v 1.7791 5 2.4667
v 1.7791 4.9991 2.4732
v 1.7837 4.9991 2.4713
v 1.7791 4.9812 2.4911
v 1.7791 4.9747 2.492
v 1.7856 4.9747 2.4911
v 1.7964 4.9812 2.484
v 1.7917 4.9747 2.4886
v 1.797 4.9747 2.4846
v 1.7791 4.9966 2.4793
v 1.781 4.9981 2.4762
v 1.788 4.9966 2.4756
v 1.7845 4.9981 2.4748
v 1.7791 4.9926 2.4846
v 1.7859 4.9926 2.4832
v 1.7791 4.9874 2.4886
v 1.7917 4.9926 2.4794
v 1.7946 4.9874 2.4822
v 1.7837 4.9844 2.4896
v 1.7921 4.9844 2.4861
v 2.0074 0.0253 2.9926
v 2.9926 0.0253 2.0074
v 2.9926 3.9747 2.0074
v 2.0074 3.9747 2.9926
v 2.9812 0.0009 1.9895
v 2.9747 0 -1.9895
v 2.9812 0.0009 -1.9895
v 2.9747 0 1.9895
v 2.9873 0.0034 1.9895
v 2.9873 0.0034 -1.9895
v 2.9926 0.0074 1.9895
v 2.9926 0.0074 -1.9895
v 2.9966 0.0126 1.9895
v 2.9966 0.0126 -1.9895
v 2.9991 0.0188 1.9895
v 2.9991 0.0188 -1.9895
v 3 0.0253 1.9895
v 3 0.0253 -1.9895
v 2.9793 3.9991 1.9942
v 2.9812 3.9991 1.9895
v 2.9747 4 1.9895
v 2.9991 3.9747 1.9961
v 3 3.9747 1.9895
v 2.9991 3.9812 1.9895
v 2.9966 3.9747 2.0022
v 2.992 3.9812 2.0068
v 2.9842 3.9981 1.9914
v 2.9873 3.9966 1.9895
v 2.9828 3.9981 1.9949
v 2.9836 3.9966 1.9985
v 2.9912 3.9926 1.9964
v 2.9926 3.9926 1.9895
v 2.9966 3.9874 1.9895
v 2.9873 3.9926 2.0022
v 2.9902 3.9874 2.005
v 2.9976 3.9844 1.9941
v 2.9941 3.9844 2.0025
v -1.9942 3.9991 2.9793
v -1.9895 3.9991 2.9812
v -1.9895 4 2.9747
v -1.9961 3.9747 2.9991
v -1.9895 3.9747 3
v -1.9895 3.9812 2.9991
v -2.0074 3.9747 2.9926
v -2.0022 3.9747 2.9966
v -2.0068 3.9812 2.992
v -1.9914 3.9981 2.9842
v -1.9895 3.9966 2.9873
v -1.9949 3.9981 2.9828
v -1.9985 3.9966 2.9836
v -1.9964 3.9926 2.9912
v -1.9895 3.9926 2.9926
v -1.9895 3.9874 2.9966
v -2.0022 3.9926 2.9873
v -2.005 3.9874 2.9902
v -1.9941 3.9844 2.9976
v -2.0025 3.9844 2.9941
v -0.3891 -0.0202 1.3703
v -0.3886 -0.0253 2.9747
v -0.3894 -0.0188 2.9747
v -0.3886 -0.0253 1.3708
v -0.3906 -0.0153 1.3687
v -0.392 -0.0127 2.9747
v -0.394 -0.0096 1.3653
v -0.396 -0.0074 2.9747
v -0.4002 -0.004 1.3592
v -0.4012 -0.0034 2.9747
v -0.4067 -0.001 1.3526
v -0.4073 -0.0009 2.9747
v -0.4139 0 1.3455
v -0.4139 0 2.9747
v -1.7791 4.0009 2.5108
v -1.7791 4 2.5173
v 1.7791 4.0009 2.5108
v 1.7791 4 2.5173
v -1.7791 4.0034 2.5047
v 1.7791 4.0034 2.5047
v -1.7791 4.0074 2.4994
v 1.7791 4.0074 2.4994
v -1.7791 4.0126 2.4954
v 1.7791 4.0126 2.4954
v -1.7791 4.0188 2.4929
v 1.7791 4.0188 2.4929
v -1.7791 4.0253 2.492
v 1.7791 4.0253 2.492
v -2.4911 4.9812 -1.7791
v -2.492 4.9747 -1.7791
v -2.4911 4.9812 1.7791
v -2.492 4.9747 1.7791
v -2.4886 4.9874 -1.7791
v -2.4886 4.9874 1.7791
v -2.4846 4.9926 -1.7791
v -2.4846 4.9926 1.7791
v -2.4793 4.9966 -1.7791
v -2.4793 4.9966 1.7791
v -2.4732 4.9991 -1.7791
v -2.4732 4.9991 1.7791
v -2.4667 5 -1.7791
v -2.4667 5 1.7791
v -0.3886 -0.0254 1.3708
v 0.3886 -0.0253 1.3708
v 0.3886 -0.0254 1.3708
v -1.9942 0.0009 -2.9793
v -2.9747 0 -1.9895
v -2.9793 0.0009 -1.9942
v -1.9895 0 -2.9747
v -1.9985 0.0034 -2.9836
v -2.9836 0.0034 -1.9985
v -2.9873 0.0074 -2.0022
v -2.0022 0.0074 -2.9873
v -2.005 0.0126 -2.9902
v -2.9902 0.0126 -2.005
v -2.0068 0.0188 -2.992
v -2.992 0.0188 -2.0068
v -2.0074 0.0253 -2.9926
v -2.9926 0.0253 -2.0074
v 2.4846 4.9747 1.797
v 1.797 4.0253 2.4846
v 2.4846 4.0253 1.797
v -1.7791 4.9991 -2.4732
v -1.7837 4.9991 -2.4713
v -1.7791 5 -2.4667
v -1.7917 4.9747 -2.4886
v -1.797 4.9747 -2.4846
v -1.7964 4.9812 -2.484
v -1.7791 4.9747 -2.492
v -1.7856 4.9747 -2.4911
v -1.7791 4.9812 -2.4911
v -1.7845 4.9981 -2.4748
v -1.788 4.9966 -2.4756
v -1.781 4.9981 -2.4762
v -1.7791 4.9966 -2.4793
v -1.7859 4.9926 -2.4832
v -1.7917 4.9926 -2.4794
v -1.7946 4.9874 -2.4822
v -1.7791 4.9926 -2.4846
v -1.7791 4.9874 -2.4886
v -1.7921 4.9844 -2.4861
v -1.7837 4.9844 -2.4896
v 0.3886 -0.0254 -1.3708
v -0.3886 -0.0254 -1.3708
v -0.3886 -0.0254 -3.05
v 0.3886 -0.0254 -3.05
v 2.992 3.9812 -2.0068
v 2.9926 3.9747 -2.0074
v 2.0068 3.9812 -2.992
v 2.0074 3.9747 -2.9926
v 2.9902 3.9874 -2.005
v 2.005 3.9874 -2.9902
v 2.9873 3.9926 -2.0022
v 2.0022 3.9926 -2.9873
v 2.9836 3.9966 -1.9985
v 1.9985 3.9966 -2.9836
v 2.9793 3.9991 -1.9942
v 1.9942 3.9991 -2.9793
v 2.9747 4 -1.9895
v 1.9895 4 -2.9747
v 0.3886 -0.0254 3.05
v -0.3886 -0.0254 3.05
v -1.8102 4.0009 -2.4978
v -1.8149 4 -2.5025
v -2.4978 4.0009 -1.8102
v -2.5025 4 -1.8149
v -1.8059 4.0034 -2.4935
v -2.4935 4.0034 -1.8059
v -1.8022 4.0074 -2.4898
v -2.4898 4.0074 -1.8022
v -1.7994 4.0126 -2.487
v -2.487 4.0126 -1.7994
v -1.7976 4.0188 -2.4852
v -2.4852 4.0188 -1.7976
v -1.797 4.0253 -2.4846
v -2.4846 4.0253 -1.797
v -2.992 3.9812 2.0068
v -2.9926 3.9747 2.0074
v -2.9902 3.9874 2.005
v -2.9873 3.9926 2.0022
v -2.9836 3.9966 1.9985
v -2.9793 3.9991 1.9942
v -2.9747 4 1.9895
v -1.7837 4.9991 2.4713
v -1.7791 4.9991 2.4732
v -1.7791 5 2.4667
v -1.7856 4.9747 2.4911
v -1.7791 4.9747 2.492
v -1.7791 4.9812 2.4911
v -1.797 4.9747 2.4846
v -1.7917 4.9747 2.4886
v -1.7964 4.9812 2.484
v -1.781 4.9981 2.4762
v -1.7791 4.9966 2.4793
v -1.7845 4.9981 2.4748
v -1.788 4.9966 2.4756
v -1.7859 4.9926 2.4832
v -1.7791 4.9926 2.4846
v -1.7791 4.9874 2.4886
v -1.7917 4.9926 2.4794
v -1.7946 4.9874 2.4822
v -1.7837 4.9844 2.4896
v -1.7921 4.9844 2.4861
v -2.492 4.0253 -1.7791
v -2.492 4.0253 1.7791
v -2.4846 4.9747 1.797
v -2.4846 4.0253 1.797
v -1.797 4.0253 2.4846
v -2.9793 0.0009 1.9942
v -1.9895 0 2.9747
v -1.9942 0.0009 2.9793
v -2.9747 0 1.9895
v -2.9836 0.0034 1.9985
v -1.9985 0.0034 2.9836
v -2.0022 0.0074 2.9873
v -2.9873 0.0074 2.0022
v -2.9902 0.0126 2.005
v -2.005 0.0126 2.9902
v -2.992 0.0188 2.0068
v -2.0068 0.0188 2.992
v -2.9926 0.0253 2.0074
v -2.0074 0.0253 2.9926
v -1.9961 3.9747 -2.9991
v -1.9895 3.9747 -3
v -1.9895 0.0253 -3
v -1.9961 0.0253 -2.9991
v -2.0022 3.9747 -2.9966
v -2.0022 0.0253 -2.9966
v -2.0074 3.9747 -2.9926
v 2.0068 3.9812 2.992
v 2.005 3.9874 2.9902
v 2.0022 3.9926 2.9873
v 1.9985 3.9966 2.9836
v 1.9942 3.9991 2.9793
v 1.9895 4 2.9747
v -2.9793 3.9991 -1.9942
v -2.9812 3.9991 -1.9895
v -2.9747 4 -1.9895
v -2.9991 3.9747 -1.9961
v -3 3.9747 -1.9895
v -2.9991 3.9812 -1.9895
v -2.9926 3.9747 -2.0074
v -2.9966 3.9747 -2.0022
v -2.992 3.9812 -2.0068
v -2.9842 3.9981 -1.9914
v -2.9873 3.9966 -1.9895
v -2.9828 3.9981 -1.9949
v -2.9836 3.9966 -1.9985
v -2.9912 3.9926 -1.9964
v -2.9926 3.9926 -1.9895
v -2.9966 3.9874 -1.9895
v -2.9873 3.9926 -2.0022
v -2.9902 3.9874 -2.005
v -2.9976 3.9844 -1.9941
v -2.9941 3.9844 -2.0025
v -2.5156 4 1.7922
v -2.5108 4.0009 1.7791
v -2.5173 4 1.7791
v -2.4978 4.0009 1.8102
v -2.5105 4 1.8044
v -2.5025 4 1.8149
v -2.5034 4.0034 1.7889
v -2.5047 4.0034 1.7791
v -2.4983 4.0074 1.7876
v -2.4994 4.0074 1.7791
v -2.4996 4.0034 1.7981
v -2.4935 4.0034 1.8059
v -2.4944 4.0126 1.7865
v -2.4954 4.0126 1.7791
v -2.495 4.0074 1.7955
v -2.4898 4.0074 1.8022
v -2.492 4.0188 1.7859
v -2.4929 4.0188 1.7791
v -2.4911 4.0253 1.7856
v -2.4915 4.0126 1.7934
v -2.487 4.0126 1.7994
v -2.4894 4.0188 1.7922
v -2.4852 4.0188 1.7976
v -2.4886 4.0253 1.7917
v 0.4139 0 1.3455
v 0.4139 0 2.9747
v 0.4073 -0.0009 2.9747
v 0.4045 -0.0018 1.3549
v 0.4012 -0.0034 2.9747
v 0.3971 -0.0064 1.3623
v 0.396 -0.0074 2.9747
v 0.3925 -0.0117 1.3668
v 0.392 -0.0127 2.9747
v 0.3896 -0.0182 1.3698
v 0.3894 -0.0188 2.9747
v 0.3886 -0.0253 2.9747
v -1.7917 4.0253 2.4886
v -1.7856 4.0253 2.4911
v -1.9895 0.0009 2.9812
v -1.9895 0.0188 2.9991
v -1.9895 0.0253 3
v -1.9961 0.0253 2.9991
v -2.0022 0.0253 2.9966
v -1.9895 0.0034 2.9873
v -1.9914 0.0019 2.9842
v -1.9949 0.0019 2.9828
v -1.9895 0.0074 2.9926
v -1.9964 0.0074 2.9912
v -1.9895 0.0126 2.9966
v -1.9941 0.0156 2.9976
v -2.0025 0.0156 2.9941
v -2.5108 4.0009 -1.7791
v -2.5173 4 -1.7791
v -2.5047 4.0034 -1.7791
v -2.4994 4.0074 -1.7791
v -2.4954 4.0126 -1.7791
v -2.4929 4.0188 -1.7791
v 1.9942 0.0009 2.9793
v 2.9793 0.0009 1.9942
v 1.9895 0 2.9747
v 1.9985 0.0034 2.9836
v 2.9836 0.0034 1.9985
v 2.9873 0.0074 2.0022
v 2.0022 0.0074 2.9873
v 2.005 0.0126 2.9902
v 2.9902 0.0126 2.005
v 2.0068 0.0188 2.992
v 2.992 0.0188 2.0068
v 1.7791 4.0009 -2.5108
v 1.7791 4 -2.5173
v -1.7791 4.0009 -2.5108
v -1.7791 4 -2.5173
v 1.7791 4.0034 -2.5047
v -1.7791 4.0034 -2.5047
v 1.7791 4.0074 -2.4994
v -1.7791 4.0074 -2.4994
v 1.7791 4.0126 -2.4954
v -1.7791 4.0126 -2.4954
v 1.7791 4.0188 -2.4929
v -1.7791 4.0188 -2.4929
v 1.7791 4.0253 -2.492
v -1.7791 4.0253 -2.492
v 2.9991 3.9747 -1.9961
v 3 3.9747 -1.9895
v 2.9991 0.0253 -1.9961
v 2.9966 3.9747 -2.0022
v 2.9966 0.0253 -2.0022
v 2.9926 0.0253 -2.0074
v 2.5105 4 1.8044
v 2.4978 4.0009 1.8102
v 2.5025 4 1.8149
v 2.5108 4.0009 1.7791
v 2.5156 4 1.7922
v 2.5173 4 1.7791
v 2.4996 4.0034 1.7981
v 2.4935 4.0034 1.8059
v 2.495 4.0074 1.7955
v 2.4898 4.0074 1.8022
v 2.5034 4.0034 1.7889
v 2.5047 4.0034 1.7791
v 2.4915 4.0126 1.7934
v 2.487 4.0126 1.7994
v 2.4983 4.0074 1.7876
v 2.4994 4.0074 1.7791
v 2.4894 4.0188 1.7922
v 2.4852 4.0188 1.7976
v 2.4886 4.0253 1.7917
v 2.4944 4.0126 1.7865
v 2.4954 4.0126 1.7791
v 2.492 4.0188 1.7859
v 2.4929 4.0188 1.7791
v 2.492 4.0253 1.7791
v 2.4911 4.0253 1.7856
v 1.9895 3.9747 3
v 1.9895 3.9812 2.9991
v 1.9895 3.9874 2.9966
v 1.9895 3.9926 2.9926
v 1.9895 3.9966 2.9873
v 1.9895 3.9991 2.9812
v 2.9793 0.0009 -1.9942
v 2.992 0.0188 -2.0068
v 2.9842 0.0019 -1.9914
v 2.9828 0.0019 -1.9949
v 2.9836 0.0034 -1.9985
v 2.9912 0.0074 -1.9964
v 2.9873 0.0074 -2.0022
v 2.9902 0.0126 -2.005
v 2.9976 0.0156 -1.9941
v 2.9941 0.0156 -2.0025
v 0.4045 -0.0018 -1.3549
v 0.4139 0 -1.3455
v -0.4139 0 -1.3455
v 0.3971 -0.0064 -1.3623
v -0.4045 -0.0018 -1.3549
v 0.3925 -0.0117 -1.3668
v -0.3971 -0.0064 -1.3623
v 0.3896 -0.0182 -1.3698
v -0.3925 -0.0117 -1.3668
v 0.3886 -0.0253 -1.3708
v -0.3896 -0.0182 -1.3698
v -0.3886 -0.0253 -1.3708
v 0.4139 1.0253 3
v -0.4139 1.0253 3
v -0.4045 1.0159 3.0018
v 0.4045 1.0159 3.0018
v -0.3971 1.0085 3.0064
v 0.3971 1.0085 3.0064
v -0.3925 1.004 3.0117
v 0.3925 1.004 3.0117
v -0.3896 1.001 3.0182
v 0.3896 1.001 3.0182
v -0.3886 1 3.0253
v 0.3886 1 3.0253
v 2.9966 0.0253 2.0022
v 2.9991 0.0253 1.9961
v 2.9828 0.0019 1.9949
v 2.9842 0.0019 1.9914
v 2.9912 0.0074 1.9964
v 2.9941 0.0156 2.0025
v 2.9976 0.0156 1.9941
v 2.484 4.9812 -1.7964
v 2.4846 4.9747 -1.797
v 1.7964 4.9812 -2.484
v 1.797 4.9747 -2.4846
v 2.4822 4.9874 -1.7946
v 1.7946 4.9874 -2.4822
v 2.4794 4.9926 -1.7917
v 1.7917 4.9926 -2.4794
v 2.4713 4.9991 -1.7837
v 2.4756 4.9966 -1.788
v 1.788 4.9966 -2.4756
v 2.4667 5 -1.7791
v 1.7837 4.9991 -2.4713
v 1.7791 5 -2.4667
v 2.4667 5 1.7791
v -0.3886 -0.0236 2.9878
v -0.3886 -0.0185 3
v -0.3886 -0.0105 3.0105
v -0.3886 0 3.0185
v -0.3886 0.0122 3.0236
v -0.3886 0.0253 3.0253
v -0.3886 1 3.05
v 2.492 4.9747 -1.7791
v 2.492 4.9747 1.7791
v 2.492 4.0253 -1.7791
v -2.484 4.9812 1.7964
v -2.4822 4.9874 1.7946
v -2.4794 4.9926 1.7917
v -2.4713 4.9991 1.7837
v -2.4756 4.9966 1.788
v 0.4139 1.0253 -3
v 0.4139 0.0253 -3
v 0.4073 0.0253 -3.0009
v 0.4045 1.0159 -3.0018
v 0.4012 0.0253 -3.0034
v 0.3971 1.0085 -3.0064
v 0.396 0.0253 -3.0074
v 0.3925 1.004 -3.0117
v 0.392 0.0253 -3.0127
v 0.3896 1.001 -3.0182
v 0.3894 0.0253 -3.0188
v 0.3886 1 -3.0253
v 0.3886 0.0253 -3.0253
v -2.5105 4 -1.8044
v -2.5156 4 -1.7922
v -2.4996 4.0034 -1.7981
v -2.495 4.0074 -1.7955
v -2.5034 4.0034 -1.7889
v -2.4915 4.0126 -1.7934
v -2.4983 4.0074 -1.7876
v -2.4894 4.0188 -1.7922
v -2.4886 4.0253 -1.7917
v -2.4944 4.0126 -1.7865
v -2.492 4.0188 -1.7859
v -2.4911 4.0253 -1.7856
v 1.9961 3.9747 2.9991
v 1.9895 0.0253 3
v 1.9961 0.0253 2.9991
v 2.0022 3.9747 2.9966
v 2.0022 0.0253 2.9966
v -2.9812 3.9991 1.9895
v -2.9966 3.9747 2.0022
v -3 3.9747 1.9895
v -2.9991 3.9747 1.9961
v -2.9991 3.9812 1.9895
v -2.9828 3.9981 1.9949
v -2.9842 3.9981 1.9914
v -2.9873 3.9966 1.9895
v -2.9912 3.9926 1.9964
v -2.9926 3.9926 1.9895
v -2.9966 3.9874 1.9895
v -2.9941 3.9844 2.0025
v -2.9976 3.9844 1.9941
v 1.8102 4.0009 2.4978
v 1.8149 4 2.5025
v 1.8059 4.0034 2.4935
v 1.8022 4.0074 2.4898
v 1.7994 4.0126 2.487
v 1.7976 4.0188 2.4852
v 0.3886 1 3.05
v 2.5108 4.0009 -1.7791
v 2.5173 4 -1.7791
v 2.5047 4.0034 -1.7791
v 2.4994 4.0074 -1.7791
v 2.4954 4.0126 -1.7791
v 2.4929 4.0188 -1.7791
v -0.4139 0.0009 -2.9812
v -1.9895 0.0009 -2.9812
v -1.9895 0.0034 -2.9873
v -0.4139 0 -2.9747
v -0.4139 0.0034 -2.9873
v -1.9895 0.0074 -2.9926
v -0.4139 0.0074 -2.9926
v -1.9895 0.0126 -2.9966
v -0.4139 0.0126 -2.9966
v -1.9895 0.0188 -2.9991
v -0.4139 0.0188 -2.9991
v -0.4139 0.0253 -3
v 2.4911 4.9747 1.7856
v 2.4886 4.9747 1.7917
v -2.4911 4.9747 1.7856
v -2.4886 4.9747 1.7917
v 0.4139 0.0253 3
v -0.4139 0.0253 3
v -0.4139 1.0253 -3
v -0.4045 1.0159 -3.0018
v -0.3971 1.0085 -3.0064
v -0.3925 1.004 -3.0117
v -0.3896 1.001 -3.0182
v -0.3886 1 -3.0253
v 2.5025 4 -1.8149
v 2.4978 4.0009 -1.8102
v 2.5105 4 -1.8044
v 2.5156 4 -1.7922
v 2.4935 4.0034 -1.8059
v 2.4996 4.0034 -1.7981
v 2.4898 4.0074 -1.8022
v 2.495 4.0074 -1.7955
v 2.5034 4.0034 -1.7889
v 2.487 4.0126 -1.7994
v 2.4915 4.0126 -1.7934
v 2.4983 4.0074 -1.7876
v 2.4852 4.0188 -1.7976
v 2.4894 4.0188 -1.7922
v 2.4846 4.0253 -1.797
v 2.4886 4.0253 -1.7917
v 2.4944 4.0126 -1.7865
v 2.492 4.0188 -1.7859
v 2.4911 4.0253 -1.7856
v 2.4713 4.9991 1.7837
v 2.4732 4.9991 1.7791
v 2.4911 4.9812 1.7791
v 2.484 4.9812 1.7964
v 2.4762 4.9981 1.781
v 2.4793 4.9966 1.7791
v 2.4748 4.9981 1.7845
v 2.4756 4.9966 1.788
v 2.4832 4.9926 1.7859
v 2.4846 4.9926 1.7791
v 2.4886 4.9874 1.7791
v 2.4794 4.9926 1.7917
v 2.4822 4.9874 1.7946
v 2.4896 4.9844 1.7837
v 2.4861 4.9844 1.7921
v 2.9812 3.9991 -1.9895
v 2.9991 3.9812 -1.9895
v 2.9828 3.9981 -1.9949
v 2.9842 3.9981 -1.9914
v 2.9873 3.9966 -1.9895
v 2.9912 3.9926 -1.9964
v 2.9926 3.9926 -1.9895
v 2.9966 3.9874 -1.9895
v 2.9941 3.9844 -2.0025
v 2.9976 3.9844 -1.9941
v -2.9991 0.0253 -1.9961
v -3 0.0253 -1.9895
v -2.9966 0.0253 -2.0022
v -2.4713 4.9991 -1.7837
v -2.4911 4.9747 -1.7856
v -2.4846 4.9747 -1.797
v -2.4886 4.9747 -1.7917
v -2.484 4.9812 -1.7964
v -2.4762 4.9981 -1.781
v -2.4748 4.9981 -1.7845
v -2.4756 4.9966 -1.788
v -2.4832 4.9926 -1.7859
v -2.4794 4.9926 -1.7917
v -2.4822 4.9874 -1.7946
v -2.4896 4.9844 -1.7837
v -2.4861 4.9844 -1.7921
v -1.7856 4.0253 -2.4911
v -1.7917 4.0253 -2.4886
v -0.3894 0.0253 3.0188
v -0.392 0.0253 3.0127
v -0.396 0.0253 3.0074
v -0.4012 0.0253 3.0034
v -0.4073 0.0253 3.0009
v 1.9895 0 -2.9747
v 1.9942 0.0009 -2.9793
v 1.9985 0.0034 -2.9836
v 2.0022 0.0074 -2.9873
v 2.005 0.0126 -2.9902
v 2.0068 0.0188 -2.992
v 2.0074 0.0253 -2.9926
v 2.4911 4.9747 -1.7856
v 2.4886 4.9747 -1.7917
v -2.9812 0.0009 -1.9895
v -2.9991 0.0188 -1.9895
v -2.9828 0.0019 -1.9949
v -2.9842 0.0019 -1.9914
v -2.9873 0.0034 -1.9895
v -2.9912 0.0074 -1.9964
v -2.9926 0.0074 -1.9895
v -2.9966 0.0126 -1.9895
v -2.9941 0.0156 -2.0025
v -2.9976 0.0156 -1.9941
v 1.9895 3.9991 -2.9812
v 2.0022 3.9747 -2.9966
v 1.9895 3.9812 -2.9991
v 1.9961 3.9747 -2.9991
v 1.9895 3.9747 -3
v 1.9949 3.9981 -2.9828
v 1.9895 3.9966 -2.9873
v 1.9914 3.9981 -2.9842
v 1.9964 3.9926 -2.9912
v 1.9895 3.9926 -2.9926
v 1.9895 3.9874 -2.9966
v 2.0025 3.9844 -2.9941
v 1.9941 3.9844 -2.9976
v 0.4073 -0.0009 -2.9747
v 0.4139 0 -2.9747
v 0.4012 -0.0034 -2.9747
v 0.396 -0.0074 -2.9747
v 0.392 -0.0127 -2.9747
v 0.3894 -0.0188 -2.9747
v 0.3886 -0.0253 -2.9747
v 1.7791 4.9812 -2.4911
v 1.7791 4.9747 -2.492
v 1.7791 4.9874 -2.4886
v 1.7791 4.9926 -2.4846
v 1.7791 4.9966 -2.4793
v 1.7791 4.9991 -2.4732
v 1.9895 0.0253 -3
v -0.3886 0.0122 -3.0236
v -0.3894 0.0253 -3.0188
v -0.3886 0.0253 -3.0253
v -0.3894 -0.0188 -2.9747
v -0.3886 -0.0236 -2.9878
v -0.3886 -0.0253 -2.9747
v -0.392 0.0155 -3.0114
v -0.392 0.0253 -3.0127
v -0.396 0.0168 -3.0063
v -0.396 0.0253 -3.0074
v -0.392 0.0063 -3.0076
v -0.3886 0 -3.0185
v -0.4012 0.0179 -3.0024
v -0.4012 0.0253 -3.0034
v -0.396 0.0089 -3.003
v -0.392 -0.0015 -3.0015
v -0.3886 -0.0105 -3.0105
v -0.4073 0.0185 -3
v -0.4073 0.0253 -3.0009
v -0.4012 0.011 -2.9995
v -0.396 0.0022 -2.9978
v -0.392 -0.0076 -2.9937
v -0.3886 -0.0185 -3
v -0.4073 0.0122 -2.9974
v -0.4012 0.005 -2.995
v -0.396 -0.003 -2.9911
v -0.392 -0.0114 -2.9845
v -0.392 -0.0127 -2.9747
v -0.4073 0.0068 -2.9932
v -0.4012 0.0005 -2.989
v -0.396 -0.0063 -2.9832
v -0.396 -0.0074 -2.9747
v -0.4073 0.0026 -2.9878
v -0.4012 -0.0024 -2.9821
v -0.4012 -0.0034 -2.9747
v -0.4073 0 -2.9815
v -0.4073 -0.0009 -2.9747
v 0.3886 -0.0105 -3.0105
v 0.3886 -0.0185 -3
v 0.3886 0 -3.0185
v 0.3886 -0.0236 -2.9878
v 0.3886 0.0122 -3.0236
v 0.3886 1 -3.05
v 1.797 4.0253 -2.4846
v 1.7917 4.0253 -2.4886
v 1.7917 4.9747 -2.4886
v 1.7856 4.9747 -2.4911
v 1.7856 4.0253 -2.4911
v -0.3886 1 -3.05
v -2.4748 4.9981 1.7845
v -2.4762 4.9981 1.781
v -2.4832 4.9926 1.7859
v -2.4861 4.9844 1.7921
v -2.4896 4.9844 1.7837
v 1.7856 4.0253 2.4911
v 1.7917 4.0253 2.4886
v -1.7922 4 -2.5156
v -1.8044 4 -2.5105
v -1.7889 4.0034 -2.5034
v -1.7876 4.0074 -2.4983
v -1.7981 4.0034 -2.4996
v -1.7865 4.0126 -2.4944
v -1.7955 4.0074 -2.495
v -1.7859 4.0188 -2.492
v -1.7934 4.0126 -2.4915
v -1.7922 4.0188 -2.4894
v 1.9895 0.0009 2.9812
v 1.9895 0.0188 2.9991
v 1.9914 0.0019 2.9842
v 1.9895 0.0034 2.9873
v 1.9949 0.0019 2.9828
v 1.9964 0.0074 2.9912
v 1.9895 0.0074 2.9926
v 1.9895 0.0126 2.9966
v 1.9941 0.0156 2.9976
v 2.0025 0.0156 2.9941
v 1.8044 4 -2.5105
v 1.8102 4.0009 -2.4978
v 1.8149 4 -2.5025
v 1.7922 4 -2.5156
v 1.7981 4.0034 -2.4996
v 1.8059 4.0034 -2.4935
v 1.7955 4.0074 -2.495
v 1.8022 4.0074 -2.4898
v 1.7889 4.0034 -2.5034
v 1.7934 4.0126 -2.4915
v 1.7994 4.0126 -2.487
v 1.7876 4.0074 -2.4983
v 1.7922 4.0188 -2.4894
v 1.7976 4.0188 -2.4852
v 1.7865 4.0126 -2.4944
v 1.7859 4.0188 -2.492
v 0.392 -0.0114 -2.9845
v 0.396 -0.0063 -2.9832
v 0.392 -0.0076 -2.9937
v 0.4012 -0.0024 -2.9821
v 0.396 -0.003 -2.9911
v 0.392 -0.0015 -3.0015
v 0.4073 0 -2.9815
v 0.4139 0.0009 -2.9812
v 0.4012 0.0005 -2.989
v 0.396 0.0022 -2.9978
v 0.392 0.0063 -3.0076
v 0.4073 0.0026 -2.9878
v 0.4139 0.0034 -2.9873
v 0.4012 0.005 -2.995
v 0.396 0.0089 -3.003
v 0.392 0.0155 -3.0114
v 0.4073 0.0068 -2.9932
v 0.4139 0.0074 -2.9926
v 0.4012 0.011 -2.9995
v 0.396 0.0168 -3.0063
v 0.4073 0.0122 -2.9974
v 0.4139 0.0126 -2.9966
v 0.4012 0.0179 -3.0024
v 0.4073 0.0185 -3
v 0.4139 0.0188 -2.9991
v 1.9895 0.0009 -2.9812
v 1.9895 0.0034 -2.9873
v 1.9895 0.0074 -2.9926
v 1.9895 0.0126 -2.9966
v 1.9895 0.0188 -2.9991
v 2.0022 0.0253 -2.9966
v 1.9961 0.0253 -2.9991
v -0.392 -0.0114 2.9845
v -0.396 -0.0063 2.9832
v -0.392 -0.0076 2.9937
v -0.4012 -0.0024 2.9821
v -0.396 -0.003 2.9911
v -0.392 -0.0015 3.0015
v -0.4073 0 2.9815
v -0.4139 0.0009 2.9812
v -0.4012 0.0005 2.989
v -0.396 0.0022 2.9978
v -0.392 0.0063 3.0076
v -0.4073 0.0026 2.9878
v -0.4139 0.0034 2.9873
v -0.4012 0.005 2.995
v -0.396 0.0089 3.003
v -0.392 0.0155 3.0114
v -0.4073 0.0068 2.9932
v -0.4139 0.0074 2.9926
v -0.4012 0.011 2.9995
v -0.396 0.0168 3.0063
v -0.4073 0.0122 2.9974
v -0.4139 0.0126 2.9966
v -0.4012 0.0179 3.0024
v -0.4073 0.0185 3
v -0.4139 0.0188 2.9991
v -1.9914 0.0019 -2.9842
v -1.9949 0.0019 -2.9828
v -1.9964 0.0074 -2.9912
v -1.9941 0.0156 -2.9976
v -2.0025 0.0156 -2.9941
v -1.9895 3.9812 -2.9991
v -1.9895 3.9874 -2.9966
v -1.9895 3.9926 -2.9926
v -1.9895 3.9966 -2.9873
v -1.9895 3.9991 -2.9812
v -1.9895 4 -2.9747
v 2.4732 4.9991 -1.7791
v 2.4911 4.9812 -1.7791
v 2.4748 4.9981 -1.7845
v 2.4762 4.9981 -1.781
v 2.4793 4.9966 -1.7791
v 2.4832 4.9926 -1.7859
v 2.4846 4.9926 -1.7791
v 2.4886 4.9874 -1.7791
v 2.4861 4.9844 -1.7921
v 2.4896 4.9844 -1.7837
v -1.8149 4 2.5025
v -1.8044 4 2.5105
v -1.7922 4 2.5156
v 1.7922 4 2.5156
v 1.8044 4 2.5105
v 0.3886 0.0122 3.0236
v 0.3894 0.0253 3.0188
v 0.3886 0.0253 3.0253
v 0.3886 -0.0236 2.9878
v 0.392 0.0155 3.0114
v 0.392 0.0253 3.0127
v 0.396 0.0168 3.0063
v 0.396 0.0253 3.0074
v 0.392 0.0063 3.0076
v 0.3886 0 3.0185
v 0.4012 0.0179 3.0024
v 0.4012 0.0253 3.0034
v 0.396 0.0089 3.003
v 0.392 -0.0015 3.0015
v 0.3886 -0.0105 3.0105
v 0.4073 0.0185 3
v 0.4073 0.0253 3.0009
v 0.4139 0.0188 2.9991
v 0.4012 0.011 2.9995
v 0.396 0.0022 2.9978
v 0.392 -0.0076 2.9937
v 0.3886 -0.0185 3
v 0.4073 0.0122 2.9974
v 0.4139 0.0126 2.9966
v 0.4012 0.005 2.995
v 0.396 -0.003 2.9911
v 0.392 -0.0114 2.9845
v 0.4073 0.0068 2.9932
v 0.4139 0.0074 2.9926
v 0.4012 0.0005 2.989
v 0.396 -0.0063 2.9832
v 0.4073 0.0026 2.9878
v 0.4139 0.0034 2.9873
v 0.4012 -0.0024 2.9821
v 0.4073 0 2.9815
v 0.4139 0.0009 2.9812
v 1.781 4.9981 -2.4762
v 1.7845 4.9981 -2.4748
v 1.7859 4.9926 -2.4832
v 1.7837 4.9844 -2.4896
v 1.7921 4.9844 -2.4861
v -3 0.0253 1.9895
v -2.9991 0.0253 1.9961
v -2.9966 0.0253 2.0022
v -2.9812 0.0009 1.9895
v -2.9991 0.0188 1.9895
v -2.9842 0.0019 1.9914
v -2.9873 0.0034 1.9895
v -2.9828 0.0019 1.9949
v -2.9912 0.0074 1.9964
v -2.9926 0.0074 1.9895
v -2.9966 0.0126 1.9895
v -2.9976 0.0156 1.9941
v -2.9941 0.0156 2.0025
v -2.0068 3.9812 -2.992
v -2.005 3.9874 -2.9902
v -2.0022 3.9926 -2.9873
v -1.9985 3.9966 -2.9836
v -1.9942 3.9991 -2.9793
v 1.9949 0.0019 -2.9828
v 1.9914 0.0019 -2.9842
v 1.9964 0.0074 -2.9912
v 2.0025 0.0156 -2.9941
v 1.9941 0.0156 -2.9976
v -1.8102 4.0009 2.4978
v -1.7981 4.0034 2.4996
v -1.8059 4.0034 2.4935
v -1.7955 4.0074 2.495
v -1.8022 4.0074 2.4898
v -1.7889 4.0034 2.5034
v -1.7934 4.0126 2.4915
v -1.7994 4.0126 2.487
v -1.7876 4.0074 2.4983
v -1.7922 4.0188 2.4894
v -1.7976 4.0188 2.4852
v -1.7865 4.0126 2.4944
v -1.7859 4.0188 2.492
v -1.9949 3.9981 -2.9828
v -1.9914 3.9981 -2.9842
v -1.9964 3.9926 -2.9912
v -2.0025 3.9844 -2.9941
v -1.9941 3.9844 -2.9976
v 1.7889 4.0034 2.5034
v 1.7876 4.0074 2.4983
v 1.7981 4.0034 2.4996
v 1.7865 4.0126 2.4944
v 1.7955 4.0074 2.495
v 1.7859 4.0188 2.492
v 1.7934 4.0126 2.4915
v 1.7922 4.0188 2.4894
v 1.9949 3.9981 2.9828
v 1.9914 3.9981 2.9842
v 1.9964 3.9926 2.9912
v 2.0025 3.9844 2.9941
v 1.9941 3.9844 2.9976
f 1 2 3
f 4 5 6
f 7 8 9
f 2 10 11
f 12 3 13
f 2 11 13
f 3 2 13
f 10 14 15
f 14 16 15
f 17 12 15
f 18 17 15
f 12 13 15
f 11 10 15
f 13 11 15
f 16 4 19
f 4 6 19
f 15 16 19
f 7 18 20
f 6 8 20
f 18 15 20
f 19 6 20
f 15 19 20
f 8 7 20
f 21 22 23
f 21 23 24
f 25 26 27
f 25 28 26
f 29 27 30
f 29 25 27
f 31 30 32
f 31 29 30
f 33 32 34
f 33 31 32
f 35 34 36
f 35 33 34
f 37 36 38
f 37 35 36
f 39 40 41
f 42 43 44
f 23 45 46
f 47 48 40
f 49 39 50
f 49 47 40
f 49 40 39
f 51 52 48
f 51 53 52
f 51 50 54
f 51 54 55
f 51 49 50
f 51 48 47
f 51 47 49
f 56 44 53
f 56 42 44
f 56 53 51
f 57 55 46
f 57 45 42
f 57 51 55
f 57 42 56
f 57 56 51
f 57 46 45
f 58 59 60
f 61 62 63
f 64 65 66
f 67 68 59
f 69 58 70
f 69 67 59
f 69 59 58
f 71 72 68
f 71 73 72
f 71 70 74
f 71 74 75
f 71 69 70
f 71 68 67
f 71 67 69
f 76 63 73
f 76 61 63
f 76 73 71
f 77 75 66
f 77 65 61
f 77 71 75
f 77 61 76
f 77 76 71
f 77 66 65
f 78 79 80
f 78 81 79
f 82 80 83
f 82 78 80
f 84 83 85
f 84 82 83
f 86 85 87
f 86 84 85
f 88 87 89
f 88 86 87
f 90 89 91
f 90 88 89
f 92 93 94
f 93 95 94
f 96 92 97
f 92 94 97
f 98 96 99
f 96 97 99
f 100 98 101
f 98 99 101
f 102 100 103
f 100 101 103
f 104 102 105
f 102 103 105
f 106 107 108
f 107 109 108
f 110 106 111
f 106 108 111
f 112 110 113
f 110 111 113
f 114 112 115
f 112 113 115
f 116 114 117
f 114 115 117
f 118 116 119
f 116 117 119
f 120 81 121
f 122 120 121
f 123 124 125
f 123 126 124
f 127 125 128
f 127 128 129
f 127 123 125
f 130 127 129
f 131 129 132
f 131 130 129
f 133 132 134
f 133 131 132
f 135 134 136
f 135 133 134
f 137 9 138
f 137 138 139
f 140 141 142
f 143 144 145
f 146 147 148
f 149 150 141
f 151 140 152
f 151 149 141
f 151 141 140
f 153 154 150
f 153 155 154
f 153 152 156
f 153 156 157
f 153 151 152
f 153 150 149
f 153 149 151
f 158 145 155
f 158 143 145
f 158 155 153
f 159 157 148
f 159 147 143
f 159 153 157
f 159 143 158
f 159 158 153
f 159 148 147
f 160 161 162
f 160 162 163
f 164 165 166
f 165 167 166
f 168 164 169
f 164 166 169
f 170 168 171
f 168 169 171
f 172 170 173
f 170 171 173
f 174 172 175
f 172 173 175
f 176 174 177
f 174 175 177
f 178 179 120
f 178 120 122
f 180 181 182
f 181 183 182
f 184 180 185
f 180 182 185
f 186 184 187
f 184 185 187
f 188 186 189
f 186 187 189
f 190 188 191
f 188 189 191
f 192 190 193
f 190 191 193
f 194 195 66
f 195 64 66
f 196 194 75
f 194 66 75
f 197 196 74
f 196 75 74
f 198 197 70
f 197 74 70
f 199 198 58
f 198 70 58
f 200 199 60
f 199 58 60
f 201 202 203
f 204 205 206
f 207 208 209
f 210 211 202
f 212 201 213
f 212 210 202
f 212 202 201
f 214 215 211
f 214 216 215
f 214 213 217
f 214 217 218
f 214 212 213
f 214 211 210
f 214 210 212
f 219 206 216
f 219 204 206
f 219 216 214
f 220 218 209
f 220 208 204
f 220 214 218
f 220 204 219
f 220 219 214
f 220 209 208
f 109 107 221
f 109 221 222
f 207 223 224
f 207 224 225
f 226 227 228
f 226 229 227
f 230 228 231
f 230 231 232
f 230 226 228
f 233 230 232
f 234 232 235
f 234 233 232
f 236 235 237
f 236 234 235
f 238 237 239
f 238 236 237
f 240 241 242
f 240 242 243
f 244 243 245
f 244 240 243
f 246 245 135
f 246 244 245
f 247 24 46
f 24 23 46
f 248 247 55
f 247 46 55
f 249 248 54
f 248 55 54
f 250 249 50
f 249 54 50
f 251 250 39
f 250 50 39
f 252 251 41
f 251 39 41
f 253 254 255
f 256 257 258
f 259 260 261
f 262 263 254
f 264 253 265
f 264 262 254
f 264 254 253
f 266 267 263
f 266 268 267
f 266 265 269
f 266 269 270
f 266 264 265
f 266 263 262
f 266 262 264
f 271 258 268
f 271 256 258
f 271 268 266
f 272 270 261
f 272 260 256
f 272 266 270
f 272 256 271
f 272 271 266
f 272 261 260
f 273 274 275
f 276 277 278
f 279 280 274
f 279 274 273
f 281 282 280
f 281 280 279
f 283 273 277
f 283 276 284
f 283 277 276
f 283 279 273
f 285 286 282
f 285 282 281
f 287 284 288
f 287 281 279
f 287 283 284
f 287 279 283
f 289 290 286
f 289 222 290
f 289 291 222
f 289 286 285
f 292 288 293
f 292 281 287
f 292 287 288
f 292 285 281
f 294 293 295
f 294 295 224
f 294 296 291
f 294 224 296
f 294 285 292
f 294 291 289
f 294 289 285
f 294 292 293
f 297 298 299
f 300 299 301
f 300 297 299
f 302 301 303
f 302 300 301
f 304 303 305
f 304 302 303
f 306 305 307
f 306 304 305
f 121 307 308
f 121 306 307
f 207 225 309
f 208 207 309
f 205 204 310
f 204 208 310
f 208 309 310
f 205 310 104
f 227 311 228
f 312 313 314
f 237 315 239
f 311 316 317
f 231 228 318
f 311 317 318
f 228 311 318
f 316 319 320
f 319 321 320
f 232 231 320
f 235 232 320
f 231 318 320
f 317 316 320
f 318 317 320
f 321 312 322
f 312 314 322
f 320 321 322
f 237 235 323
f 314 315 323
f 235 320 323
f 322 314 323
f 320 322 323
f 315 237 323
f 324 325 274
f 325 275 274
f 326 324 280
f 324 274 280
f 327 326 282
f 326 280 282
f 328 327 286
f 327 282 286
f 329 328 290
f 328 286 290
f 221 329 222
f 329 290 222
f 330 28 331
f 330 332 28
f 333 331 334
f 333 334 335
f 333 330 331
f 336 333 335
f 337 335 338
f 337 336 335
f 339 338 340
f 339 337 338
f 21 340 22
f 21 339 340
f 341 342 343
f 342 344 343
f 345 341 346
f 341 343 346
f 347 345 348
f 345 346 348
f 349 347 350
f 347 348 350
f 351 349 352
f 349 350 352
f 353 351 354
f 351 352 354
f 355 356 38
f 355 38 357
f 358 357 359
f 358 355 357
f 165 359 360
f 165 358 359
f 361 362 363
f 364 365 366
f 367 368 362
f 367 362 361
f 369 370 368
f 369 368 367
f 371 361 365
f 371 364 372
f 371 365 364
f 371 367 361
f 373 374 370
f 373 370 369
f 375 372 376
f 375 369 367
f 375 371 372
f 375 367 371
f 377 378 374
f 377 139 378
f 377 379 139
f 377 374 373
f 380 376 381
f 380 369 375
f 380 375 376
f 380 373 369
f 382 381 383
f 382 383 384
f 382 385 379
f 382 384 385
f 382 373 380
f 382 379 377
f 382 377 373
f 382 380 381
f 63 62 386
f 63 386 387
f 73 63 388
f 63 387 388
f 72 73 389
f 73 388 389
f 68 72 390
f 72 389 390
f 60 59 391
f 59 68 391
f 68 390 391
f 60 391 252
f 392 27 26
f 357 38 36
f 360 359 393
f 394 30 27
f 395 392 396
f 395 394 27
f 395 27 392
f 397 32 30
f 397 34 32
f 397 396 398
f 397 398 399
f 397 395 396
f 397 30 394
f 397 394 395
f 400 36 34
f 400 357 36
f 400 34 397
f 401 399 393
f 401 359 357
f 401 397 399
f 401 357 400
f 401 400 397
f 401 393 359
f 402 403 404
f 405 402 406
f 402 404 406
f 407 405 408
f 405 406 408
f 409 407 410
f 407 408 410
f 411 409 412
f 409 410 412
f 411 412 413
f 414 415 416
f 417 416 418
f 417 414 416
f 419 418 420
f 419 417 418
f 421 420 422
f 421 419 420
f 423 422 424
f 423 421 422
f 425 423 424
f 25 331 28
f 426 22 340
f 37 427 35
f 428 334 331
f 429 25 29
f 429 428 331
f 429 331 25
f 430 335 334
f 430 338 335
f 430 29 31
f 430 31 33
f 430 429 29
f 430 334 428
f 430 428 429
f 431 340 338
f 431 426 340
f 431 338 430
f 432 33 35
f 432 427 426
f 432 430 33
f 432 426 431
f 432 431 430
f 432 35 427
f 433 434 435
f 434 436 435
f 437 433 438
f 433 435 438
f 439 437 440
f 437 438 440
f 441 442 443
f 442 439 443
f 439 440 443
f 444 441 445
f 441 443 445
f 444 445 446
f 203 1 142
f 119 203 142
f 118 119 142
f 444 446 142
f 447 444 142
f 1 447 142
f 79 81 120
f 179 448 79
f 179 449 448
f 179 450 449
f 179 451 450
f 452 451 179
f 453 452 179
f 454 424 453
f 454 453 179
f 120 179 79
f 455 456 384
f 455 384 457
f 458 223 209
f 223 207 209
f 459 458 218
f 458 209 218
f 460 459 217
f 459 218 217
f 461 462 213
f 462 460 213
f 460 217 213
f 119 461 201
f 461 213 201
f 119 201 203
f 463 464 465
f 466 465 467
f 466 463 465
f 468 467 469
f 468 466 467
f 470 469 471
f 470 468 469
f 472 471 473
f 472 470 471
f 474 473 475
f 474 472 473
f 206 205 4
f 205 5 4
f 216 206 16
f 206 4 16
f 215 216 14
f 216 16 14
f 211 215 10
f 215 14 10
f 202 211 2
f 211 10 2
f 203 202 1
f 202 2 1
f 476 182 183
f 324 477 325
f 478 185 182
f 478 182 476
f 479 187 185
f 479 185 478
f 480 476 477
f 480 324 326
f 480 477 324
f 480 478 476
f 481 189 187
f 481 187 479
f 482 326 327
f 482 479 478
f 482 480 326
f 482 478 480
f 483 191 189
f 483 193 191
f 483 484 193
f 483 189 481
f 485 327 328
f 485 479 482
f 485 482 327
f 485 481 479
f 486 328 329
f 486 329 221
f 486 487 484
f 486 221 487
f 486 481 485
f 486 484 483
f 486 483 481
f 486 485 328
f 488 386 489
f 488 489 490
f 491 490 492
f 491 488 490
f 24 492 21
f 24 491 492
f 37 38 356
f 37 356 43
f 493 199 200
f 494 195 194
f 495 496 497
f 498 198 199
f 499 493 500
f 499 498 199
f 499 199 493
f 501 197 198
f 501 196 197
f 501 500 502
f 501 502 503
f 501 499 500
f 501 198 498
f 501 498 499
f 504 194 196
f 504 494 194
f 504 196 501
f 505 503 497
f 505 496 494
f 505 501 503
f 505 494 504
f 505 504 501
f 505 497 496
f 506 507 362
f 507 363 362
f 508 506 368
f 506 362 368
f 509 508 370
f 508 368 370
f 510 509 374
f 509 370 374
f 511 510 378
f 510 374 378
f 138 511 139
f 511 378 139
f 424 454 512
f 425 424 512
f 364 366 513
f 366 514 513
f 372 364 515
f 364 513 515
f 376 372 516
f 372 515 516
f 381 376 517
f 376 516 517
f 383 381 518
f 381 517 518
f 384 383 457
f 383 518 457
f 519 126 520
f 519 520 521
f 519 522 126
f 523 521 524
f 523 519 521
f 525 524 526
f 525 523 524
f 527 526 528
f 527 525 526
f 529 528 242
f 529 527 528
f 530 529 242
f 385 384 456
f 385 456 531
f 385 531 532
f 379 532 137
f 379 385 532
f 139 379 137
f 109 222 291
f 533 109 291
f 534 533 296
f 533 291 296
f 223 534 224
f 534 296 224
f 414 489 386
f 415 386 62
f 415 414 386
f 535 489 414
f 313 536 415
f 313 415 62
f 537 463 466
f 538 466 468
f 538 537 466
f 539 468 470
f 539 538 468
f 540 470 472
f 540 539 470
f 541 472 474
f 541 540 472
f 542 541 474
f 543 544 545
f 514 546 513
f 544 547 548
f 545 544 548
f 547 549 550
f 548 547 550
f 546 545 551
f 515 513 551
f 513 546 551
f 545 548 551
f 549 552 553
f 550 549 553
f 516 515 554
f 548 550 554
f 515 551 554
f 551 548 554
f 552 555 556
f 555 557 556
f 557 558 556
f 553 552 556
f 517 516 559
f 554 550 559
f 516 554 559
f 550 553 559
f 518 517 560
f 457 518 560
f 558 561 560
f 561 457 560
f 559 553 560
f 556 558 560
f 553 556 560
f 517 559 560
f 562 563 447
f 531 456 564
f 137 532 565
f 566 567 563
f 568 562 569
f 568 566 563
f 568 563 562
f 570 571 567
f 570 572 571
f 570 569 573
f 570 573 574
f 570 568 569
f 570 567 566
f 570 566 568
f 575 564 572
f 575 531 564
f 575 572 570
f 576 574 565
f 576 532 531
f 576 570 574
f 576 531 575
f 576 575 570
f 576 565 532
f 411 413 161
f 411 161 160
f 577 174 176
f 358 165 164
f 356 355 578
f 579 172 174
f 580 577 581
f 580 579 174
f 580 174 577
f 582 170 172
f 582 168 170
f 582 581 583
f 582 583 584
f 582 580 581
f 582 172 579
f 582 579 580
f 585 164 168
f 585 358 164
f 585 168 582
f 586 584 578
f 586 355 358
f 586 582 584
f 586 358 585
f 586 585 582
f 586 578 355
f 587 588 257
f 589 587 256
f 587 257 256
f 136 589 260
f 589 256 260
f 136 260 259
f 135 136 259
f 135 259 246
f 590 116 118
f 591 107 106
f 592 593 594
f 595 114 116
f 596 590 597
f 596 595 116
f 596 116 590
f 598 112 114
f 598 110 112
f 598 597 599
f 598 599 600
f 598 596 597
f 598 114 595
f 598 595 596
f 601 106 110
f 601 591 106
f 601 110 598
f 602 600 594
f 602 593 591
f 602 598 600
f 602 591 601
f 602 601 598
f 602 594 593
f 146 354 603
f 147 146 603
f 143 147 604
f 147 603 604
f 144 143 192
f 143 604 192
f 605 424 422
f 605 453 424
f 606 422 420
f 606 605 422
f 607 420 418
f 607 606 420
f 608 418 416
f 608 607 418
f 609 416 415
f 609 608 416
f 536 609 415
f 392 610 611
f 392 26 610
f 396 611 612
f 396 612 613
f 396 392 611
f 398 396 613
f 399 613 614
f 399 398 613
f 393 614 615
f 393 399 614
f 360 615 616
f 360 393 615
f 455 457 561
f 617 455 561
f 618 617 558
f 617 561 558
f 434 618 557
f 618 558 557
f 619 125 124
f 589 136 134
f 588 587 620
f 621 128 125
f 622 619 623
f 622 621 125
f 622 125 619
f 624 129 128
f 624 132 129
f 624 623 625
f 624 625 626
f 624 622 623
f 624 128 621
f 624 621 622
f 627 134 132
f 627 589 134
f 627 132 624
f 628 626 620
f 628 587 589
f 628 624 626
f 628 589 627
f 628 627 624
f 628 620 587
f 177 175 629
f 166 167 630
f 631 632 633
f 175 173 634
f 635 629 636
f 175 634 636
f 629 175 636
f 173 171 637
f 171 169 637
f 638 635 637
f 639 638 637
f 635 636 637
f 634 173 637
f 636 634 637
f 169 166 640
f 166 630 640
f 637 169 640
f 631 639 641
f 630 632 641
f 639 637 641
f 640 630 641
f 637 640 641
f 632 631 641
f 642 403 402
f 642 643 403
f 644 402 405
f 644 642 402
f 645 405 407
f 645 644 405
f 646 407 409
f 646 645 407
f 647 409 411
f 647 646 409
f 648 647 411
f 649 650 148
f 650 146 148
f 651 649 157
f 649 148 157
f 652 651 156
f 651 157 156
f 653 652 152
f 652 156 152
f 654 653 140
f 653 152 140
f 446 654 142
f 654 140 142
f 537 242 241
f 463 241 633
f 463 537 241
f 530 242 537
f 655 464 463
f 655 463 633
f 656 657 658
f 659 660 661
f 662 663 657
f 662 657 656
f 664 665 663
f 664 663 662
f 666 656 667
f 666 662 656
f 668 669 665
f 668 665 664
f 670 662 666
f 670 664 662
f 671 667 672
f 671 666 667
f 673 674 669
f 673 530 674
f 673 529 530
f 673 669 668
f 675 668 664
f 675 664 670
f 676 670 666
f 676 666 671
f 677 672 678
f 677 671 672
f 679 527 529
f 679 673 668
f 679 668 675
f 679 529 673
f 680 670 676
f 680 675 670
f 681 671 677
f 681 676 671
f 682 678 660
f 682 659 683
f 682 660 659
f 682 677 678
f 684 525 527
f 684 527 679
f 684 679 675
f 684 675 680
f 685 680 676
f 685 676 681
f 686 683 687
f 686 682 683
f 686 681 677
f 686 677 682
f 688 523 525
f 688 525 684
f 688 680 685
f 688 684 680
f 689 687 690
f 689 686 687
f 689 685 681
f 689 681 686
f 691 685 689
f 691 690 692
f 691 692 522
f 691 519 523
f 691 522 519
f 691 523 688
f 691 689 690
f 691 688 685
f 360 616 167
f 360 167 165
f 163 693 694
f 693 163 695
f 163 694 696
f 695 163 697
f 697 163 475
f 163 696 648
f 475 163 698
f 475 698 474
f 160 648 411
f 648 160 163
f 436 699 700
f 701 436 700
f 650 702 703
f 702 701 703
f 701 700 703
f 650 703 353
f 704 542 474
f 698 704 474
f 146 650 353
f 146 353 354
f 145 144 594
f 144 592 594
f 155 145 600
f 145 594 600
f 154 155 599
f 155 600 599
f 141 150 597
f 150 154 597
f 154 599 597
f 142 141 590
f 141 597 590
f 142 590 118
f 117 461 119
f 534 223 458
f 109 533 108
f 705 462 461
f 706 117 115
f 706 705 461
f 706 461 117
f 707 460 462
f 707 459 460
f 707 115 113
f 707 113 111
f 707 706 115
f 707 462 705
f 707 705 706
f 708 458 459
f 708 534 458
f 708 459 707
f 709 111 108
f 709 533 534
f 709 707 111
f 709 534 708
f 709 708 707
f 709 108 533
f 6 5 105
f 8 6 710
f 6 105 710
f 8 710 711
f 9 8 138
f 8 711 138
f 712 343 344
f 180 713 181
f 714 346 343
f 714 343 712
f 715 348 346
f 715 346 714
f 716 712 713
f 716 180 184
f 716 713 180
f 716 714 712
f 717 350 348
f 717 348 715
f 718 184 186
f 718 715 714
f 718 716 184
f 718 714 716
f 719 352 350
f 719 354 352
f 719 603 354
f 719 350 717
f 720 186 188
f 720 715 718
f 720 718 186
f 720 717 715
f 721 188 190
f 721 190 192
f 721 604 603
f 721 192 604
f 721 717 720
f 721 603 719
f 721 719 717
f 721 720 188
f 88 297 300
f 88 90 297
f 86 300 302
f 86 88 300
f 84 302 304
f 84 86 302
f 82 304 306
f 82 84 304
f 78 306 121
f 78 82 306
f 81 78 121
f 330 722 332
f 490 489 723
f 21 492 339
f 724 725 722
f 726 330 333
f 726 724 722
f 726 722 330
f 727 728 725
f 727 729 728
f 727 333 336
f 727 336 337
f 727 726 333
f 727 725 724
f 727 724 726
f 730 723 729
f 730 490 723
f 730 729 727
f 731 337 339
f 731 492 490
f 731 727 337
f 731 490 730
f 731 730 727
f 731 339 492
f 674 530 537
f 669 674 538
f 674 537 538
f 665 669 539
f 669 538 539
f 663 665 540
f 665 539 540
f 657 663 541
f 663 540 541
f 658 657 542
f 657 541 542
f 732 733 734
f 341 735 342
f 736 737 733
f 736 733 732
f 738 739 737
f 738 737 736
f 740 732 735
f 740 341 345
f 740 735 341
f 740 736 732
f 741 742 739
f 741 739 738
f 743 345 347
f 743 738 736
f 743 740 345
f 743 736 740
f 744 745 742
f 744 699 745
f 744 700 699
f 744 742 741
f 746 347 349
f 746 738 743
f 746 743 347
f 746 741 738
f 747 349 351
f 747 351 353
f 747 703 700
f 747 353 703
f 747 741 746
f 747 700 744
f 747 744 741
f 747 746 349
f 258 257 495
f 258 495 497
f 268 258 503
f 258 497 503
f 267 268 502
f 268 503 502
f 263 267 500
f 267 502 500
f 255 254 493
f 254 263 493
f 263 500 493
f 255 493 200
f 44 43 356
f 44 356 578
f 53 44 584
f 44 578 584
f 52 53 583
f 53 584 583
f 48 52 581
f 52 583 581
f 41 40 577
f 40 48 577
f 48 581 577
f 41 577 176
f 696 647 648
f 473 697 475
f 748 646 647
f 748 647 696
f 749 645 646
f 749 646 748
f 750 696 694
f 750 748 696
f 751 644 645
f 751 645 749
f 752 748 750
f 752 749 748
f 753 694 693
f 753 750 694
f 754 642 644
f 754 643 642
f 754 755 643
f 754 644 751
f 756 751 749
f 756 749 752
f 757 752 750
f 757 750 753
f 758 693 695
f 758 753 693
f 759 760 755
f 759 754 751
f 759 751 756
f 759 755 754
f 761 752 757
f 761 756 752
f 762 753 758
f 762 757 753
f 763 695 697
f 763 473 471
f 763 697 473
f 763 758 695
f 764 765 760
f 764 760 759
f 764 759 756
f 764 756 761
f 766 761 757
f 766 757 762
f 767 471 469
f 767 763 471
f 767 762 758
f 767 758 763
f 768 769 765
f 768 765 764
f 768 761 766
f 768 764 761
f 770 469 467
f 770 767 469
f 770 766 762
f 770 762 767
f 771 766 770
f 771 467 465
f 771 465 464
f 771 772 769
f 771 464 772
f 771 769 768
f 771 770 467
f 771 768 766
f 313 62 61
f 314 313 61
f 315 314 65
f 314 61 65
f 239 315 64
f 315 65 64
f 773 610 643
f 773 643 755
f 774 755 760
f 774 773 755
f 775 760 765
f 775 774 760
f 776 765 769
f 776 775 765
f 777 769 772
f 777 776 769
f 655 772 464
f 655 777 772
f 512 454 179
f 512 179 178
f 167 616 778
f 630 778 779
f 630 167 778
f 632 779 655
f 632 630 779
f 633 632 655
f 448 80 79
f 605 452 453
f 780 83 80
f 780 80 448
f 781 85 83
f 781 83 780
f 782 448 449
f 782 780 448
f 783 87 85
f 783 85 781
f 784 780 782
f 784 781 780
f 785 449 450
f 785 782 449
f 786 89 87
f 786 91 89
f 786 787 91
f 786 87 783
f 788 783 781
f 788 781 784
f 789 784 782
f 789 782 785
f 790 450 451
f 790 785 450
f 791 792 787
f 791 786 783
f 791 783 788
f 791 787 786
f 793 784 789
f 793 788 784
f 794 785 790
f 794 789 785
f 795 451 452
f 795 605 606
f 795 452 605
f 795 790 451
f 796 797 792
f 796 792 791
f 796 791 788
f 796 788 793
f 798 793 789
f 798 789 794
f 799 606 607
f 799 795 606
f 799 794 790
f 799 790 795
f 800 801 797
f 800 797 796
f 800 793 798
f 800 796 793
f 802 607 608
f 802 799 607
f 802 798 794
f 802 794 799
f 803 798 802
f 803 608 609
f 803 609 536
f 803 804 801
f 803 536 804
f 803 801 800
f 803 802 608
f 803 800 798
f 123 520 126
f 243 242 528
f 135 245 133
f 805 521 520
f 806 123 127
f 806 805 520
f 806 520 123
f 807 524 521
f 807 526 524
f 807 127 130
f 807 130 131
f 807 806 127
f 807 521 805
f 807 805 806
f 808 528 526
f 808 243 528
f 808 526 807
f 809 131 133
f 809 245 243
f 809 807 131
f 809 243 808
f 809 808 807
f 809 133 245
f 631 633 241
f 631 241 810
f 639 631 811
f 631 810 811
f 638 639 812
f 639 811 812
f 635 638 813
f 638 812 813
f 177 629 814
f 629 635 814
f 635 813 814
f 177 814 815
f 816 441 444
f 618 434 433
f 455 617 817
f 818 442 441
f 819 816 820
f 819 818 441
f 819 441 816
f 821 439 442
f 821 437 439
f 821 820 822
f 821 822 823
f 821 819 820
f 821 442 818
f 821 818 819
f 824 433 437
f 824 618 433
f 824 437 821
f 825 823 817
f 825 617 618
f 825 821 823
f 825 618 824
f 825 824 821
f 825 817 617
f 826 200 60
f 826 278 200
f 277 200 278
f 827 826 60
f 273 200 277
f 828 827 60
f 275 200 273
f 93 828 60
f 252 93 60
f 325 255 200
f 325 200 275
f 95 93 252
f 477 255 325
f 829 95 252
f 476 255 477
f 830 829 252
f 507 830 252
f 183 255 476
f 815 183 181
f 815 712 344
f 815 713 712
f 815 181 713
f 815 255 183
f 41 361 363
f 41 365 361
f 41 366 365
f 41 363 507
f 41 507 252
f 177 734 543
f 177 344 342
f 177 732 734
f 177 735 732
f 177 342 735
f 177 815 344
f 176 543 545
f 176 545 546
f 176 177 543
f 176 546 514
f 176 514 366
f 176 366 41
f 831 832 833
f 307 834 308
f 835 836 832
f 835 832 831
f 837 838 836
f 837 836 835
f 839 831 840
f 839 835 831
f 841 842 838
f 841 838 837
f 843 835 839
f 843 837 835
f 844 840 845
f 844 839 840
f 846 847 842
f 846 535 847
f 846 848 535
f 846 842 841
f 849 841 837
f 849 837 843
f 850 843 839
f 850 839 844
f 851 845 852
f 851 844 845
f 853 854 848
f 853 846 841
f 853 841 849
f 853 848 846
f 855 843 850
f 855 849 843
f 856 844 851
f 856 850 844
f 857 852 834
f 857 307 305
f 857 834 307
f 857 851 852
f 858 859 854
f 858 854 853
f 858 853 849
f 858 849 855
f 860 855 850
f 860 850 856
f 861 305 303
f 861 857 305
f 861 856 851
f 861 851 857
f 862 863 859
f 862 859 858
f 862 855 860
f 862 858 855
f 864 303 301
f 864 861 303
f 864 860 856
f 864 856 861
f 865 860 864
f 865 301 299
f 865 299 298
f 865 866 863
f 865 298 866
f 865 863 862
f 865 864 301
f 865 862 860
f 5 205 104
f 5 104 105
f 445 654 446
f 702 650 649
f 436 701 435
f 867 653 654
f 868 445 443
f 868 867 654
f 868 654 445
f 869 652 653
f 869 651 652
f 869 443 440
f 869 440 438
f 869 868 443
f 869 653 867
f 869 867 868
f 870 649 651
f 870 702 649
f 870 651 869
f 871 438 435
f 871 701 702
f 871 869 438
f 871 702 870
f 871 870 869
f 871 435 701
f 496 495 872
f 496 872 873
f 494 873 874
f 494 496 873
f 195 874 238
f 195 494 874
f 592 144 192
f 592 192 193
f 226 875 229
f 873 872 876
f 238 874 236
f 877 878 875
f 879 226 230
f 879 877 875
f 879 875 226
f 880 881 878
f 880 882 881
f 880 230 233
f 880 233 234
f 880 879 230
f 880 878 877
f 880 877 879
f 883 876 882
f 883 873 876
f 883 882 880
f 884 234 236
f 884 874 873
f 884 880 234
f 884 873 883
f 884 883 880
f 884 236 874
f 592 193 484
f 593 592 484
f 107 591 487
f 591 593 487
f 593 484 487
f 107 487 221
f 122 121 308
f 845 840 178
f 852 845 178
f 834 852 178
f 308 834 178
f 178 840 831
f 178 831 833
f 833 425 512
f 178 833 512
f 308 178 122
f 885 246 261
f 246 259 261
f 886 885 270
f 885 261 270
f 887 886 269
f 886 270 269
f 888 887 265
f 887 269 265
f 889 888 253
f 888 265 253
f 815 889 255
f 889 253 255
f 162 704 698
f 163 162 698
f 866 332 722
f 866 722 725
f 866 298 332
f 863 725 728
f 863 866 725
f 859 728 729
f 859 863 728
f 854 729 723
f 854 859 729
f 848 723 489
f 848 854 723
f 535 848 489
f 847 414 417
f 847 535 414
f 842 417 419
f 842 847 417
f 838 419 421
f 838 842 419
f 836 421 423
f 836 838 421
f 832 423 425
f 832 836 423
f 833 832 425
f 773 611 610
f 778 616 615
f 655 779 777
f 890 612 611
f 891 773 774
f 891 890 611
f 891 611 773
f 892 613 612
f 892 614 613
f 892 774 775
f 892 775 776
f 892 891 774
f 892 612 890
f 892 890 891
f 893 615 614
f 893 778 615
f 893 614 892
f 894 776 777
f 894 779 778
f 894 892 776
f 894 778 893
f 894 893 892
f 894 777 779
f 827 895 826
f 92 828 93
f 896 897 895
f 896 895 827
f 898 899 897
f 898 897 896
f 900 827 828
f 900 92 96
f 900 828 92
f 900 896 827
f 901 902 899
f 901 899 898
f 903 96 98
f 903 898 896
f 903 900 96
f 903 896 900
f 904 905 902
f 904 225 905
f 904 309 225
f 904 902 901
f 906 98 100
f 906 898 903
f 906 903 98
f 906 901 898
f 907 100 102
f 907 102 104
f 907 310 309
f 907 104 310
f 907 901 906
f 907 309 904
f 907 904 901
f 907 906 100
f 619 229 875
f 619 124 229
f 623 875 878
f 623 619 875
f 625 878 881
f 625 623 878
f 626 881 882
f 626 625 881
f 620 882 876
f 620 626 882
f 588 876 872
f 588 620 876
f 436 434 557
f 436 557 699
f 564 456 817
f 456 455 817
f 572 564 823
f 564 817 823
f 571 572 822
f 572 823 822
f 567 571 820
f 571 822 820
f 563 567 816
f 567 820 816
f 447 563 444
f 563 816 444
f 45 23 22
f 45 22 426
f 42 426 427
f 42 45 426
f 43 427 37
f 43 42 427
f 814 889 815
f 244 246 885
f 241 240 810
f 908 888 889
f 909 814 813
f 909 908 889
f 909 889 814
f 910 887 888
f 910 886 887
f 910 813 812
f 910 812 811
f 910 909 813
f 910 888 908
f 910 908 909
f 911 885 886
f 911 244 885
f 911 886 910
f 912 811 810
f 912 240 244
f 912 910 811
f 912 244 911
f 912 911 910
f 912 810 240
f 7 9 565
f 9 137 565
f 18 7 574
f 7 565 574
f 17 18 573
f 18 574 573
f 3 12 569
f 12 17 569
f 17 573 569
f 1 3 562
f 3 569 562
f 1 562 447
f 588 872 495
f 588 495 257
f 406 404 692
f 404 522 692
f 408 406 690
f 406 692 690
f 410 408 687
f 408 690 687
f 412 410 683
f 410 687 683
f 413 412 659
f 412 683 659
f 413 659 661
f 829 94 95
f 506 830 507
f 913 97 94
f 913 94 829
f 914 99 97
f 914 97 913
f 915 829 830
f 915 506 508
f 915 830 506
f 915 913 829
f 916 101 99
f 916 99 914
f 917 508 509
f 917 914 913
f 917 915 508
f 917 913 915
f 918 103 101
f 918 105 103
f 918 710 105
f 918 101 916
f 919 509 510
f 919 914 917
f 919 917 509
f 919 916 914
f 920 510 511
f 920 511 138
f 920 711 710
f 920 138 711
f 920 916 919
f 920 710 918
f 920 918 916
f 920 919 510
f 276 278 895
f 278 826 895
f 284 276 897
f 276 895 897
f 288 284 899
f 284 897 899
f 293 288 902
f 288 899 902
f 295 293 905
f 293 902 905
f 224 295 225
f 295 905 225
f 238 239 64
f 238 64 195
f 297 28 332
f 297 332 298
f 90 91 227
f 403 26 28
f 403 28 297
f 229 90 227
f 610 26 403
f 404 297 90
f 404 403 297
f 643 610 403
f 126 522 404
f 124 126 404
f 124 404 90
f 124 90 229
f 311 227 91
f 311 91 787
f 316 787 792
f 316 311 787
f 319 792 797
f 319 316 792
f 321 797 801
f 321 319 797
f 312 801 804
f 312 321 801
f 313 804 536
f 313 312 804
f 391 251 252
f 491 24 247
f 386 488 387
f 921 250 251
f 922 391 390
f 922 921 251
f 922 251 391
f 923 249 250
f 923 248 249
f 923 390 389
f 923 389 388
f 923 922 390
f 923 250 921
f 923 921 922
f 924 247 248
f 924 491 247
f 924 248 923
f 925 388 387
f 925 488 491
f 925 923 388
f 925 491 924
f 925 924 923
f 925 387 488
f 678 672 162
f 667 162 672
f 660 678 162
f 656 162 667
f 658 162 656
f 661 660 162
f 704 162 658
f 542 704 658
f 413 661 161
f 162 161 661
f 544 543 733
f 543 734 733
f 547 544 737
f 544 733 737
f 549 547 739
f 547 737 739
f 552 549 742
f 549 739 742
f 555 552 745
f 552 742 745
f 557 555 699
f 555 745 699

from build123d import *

# Parameters (mm, degrees)
BOSS_EXTRUDE1_DEPTH      = 5
CUT_EXTRUDE1_DEPTH       = 1
BOSS_EXTRUDE2_DEPTH      = 0.0254
BOSS_EXTRUDE2_DEPTH_BACK = 1
SKETCH3_W                = 0.777152918
SKETCH3_H                = 1.679205413
FILLET1_R                = 0.0254


with BuildPart() as part:
    # Sketch1 → Boss-Extrude1 (new body)
    with BuildSketch(Plane(origin=(0, 0, 0), x_dir=(1, 0, 0), z_dir=(0, 1, 0))):
        Polygon((-3, 2), (-2, 3), (2, 3), (3, 2), (3, -2), (2, -3), (-2, -3), (-3, -2), align=None)
    extrude(amount=BOSS_EXTRUDE1_DEPTH)

    # Sketch2 → Cut-Extrude1 (cut)
    with BuildSketch(Plane(origin=(0, 5, 0), x_dir=(1, 0, 0), z_dir=(0, 1, 0))):
        Polygon((3, -2), (3, 2), (2, 3), (-2, 3), (-3, 2), (-3, -2), (-2, -3), (2, -3), align=None)
        Polygon((2.492, -1.78957951), (2.492, 1.78957951), (1.78957951, 2.492), (-1.78957951, 2.492), (-2.492, 1.78957951), (-2.492, -1.78957951), (-1.78957951, -2.492), (1.78957951, -2.492), align=None, mode=Mode.SUBTRACT)
    extrude(amount=-CUT_EXTRUDE1_DEPTH, mode=Mode.SUBTRACT)

    # Sketch3 → Boss-Extrude2 (add, two sides: drawn at the far end of the back side and taken through both)
    with BuildSketch(Plane.XZ.offset(-BOSS_EXTRUDE2_DEPTH_BACK)):
        with Locations((0, 2.210397294)):
            Rectangle(SKETCH3_W, SKETCH3_H)
        with Locations((0, -2.210397294)):
            Rectangle(SKETCH3_W, SKETCH3_H)
    extrude(amount=BOSS_EXTRUDE2_DEPTH + BOSS_EXTRUDE2_DEPTH_BACK)

    # Fillet1
    fillet1_edges = [part.edges().sort_by_distance(p)[0] for p in [
        (0.388576459, 0, 2.185397293),
        (0.388576459, 0, -2.185397293),
        (0, 0, -1.370794587),
        (-0.388576459, 0, -2.185397293),
        (-0.388576459, 0, 2.185397293),
        (0, 0, 1.370794587),
        (1.78957951, 4.5, -2.492),
        (2.492, 4.5, -1.78957951),
        (2.492, 4.5, 1.78957951),
        (1.78957951, 4.5, 2.492),
        (-1.78957951, 4.5, 2.492),
        (-2.492, 4.5, 1.78957951),
        (-2.492, 4.5, -1.78957951),
        (-1.78957951, 4.5, -2.492),
        (0, 5, 2.492),
        (-2.140789755, 5, 2.140789755),
        (-2.492, 5, 0),
        (-2.140789755, 5, -2.140789755),
        (0, 5, -2.492),
        (2.140789755, 5, -2.140789755),
        (2.492, 5, 0),
        (2.140789755, 5, 2.140789755),
        (2.140789755, 4, -2.140789755),
        (0, 4, -2.492),
        (-2.140789755, 4, -2.140789755),
        (-2.492, 4, 0),
        (-2.140789755, 4, 2.140789755),
        (0, 4, 2.492),
        (2.140789755, 4, 2.140789755),
        (2.492, 4, 0),
        (0, 4, -3),
        (-1.19428823, 0, -3),
        (-0.388576459, 0.5, -3),
        (0, 1, -3),
        (0.388576459, 0.5, -3),
        (1.19428823, 0, -3),
        (-2.5, 0, -2.5),
        (-2, 2, -3),
        (-2.5, 4, -2.5),
        (-3, 0, 0),
        (-3, 2, -2),
        (-3, 4, 0),
        (-2.5, 0, 2.5),
        (-3, 2, 2),
        (-2.5, 4, 2.5),
        (-2, 2, 3),
        (0, 4, 3),
        (1.19428823, 0, 3),
        (0.388576459, 0.5, 3),
        (0, 1, 3),
        (-0.388576459, 0.5, 3),
        (-1.19428823, 0, 3),
        (2.5, 0, 2.5),
        (2, 2, 3),
        (2.5, 4, 2.5),
        (3, 0, 0),
        (3, 2, 2),
        (3, 4, 0),
        (2, 2, -3),
        (2.5, 0, -2.5),
        (3, 2, -2),
        (2.5, 4, -2.5),
    ]]
    fillet(fillet1_edges, radius=FILLET1_R - 0.0001)  # a hair under: the kernel refuses the full size


solid = part.part
